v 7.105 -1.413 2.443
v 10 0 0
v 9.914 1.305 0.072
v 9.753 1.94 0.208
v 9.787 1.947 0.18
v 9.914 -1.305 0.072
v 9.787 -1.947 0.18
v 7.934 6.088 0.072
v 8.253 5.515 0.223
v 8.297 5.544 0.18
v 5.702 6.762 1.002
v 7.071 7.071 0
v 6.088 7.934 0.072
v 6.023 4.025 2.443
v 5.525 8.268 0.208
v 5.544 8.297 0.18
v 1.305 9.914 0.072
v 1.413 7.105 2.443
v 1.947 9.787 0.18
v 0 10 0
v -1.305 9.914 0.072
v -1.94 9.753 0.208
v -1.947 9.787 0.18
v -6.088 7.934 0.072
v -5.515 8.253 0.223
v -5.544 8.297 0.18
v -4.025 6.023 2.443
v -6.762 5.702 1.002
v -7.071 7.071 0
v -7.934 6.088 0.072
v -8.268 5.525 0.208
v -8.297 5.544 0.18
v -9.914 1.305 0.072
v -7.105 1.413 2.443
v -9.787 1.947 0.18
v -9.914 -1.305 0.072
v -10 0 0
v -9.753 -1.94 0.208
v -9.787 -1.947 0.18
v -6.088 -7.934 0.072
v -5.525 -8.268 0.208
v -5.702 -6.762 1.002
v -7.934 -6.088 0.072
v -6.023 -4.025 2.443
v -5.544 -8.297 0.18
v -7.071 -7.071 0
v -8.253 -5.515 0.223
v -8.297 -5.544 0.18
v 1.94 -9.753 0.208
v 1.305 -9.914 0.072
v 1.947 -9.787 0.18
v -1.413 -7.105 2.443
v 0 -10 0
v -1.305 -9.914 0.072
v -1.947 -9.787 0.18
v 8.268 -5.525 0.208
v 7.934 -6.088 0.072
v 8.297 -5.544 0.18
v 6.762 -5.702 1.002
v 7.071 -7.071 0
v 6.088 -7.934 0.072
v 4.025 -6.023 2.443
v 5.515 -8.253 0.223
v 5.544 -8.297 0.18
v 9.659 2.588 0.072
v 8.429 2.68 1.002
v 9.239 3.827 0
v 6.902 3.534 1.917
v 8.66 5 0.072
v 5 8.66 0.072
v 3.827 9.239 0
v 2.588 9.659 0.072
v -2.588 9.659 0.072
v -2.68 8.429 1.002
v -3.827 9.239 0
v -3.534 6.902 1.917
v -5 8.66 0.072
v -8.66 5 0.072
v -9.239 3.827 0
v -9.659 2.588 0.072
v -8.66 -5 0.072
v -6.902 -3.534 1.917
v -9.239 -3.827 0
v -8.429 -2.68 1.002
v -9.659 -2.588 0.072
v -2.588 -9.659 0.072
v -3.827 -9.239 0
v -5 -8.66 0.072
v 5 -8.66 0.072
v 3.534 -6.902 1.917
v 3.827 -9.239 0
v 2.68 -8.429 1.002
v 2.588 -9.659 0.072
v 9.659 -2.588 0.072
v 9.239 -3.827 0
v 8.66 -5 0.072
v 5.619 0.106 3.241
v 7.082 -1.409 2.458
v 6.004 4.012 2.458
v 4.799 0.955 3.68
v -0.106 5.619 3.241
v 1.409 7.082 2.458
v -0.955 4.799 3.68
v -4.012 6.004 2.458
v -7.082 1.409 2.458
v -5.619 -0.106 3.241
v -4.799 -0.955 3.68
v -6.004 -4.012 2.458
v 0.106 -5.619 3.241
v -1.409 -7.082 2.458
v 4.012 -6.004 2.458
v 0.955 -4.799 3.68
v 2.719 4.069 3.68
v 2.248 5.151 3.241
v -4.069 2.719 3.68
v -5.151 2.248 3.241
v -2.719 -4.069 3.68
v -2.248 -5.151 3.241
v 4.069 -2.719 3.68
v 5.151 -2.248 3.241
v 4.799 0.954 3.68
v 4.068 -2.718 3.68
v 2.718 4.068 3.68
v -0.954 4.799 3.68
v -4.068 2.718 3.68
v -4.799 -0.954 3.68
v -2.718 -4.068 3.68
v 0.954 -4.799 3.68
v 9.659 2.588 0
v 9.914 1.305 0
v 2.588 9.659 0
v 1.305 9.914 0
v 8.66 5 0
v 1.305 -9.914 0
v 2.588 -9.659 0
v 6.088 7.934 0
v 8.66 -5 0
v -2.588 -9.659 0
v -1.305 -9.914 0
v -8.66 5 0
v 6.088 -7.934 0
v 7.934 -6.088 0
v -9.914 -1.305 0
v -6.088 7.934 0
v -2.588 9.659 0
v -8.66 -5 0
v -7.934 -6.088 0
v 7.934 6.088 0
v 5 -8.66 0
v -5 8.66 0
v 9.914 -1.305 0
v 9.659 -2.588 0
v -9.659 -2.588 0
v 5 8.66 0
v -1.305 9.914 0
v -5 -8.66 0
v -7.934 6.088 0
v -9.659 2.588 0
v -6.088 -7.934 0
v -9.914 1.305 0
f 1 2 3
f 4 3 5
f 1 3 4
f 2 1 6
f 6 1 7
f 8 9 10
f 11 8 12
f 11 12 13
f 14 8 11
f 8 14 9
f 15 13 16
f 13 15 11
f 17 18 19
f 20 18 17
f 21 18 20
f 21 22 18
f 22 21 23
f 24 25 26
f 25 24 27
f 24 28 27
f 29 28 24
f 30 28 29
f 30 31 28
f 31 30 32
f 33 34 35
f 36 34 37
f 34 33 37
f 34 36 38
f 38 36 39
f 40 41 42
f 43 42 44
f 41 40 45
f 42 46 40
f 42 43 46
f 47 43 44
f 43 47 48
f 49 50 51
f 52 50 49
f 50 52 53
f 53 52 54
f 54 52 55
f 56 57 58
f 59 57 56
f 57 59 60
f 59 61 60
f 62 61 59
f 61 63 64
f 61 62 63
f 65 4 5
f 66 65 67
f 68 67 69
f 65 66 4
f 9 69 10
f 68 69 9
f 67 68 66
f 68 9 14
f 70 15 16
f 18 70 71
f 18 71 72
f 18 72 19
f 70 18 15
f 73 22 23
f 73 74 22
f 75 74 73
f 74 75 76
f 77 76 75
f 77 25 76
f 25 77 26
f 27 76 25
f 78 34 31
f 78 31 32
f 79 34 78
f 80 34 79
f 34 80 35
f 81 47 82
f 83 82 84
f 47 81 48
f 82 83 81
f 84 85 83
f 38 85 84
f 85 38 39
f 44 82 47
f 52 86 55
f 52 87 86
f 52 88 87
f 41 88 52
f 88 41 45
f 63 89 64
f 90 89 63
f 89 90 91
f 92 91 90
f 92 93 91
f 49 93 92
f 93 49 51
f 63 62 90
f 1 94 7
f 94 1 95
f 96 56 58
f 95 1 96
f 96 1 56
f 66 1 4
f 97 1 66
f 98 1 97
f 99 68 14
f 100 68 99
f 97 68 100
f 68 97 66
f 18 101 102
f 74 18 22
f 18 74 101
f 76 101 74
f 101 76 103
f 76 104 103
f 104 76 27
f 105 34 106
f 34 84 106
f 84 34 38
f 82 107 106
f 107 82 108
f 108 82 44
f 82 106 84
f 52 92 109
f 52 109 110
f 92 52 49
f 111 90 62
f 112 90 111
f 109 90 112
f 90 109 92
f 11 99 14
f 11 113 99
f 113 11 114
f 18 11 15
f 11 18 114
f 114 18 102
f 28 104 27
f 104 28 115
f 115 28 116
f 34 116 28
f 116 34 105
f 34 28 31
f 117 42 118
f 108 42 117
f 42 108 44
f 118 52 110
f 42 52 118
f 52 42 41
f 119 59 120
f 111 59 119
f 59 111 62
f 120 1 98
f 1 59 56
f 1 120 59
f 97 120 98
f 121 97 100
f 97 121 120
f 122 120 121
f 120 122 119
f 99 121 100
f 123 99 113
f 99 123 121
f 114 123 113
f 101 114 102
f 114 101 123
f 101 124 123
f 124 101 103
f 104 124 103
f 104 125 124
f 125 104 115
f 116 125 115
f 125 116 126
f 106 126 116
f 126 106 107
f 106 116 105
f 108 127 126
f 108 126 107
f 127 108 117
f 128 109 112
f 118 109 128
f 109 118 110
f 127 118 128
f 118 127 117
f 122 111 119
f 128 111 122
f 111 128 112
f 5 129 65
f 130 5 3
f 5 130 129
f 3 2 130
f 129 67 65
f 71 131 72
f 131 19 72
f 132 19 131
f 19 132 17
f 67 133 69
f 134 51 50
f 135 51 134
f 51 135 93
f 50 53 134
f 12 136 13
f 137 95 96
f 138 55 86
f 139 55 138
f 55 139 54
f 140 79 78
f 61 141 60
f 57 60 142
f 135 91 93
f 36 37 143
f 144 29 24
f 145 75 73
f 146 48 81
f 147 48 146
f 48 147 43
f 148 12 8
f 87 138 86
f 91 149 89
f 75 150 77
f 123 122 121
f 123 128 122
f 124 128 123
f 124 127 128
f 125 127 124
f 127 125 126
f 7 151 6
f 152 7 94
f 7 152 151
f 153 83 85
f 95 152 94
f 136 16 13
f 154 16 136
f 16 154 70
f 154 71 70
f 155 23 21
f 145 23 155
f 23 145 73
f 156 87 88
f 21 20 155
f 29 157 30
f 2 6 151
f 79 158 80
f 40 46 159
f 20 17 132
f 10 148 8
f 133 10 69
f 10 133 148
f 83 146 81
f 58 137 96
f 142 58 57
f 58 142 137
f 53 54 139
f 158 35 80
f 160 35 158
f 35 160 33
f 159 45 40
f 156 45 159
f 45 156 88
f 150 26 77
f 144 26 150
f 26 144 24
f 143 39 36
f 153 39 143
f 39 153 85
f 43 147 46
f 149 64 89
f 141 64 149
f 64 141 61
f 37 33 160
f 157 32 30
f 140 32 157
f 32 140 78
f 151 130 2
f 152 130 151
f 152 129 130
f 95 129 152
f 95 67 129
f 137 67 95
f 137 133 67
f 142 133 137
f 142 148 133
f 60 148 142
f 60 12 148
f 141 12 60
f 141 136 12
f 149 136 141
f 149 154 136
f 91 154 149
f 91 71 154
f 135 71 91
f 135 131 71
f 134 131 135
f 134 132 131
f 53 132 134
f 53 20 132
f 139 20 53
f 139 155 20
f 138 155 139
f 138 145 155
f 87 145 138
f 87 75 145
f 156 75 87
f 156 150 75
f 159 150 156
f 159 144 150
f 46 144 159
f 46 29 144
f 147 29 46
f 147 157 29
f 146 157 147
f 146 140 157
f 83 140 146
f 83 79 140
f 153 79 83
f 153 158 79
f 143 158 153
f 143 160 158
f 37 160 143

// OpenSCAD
module sea_urchin()
difine();
//valiable data

//Diamond_size_d
dd=20;//[10:40]

//Diamond_hight_retio
hr=0.615;

// ignore variable values
pag1=42.45*1;//Pavillion_angle1
pag2=40.75*1;////Pavillion_angle2
cag3=40.16*1;////Crown_angle3
cag4=34.5*1;////Crown_angle4
cag5=24.35*1;////Crown_angle4
dh=dd*hr;//Diamond_hight_retio

difference(){
    difference() {
			translate([0,0,-dd*0.431])cylinder(h=dh,r=dd/2,$fn=48);	
union(){
	for (i = [ 0 : 8-1] ) {
				rotate([0,0,360/8*i]) translate([dd/2,0,-5/cos(pag1)]) rotate([0,90-pag1,0])cube(size=[dd/2,dd/2,1.1*dd], center=true);
							}
for (i = [ 0 : 8-1] ) {
				rotate([0,0,360/8*i+22.5]) translate([dd/2,0,-5/cos(pag1)]) rotate([0,90-pag1,0])cube(size=[dd/2,dd/2,1.1*dd], center=true);
							}
	for (i = [ 0 : 8-1] ) {
				rotate([0,0,360/8*i+11.25]) translate([dd/2,0,-5/cos(pag1)]) rotate([0,90-pag2,0])cube(size=[dd/2,dd/2,dd], center=true);
							}
}
union(){
	for (i = [ 0 : 8-1] ) {
		rotate([0,0,360/8*i]) translate([dd/2,0,5/cos(cag3)]) rotate([0,90-cag3,180])cube(size=[dd/2,dd/2,dd], center=true);
							}
for (i = [ 0 : 8-1] ) {
		rotate([0,0,360/8*i+22.5]) translate([dd/2,0,5/cos(cag3)]) rotate([0,90-cag3,180])cube(size=[dd/2,dd/2,dd], center=true);
							}
}
union(){
	for (i = [ 0 : 4-1] ) {
		rotate([0,0,360/4*i+11.25]) translate([dd/2,0,5/cos(cag4)+0.0085*dd]) rotate([0,90-cag4,180])cube(size=[dd/2,dd/2,dd], center=true);
							}
for (i = [ 0 : 4-1] ) {
		rotate([0,0,360/4*i+11.25+45]) translate([dd/2,0,5/cos(cag4)+0.0085*dd]) rotate([0,90-cag4,180])cube(size=[dd/2,dd/2,dd], center=true);
							}
	for (i = [ 0 : 8-1] ) {
	rotate([0,0,360/8*i-11.25]) translate([dd/2,0,5/cos(cag5)+0.060*dd]) rotate([0,90-cag5,180])cube(size=[dd/2,dd/2,dd], center=true);
							}
		}
			};
            translate([-dd/2,-dd/2,-dd]) cube(dd,dd,dd);}
            
//module sea_urchin();


//translate([-dd/2,-dd/2,-dd]) cube(dd,dd,dd);
	


